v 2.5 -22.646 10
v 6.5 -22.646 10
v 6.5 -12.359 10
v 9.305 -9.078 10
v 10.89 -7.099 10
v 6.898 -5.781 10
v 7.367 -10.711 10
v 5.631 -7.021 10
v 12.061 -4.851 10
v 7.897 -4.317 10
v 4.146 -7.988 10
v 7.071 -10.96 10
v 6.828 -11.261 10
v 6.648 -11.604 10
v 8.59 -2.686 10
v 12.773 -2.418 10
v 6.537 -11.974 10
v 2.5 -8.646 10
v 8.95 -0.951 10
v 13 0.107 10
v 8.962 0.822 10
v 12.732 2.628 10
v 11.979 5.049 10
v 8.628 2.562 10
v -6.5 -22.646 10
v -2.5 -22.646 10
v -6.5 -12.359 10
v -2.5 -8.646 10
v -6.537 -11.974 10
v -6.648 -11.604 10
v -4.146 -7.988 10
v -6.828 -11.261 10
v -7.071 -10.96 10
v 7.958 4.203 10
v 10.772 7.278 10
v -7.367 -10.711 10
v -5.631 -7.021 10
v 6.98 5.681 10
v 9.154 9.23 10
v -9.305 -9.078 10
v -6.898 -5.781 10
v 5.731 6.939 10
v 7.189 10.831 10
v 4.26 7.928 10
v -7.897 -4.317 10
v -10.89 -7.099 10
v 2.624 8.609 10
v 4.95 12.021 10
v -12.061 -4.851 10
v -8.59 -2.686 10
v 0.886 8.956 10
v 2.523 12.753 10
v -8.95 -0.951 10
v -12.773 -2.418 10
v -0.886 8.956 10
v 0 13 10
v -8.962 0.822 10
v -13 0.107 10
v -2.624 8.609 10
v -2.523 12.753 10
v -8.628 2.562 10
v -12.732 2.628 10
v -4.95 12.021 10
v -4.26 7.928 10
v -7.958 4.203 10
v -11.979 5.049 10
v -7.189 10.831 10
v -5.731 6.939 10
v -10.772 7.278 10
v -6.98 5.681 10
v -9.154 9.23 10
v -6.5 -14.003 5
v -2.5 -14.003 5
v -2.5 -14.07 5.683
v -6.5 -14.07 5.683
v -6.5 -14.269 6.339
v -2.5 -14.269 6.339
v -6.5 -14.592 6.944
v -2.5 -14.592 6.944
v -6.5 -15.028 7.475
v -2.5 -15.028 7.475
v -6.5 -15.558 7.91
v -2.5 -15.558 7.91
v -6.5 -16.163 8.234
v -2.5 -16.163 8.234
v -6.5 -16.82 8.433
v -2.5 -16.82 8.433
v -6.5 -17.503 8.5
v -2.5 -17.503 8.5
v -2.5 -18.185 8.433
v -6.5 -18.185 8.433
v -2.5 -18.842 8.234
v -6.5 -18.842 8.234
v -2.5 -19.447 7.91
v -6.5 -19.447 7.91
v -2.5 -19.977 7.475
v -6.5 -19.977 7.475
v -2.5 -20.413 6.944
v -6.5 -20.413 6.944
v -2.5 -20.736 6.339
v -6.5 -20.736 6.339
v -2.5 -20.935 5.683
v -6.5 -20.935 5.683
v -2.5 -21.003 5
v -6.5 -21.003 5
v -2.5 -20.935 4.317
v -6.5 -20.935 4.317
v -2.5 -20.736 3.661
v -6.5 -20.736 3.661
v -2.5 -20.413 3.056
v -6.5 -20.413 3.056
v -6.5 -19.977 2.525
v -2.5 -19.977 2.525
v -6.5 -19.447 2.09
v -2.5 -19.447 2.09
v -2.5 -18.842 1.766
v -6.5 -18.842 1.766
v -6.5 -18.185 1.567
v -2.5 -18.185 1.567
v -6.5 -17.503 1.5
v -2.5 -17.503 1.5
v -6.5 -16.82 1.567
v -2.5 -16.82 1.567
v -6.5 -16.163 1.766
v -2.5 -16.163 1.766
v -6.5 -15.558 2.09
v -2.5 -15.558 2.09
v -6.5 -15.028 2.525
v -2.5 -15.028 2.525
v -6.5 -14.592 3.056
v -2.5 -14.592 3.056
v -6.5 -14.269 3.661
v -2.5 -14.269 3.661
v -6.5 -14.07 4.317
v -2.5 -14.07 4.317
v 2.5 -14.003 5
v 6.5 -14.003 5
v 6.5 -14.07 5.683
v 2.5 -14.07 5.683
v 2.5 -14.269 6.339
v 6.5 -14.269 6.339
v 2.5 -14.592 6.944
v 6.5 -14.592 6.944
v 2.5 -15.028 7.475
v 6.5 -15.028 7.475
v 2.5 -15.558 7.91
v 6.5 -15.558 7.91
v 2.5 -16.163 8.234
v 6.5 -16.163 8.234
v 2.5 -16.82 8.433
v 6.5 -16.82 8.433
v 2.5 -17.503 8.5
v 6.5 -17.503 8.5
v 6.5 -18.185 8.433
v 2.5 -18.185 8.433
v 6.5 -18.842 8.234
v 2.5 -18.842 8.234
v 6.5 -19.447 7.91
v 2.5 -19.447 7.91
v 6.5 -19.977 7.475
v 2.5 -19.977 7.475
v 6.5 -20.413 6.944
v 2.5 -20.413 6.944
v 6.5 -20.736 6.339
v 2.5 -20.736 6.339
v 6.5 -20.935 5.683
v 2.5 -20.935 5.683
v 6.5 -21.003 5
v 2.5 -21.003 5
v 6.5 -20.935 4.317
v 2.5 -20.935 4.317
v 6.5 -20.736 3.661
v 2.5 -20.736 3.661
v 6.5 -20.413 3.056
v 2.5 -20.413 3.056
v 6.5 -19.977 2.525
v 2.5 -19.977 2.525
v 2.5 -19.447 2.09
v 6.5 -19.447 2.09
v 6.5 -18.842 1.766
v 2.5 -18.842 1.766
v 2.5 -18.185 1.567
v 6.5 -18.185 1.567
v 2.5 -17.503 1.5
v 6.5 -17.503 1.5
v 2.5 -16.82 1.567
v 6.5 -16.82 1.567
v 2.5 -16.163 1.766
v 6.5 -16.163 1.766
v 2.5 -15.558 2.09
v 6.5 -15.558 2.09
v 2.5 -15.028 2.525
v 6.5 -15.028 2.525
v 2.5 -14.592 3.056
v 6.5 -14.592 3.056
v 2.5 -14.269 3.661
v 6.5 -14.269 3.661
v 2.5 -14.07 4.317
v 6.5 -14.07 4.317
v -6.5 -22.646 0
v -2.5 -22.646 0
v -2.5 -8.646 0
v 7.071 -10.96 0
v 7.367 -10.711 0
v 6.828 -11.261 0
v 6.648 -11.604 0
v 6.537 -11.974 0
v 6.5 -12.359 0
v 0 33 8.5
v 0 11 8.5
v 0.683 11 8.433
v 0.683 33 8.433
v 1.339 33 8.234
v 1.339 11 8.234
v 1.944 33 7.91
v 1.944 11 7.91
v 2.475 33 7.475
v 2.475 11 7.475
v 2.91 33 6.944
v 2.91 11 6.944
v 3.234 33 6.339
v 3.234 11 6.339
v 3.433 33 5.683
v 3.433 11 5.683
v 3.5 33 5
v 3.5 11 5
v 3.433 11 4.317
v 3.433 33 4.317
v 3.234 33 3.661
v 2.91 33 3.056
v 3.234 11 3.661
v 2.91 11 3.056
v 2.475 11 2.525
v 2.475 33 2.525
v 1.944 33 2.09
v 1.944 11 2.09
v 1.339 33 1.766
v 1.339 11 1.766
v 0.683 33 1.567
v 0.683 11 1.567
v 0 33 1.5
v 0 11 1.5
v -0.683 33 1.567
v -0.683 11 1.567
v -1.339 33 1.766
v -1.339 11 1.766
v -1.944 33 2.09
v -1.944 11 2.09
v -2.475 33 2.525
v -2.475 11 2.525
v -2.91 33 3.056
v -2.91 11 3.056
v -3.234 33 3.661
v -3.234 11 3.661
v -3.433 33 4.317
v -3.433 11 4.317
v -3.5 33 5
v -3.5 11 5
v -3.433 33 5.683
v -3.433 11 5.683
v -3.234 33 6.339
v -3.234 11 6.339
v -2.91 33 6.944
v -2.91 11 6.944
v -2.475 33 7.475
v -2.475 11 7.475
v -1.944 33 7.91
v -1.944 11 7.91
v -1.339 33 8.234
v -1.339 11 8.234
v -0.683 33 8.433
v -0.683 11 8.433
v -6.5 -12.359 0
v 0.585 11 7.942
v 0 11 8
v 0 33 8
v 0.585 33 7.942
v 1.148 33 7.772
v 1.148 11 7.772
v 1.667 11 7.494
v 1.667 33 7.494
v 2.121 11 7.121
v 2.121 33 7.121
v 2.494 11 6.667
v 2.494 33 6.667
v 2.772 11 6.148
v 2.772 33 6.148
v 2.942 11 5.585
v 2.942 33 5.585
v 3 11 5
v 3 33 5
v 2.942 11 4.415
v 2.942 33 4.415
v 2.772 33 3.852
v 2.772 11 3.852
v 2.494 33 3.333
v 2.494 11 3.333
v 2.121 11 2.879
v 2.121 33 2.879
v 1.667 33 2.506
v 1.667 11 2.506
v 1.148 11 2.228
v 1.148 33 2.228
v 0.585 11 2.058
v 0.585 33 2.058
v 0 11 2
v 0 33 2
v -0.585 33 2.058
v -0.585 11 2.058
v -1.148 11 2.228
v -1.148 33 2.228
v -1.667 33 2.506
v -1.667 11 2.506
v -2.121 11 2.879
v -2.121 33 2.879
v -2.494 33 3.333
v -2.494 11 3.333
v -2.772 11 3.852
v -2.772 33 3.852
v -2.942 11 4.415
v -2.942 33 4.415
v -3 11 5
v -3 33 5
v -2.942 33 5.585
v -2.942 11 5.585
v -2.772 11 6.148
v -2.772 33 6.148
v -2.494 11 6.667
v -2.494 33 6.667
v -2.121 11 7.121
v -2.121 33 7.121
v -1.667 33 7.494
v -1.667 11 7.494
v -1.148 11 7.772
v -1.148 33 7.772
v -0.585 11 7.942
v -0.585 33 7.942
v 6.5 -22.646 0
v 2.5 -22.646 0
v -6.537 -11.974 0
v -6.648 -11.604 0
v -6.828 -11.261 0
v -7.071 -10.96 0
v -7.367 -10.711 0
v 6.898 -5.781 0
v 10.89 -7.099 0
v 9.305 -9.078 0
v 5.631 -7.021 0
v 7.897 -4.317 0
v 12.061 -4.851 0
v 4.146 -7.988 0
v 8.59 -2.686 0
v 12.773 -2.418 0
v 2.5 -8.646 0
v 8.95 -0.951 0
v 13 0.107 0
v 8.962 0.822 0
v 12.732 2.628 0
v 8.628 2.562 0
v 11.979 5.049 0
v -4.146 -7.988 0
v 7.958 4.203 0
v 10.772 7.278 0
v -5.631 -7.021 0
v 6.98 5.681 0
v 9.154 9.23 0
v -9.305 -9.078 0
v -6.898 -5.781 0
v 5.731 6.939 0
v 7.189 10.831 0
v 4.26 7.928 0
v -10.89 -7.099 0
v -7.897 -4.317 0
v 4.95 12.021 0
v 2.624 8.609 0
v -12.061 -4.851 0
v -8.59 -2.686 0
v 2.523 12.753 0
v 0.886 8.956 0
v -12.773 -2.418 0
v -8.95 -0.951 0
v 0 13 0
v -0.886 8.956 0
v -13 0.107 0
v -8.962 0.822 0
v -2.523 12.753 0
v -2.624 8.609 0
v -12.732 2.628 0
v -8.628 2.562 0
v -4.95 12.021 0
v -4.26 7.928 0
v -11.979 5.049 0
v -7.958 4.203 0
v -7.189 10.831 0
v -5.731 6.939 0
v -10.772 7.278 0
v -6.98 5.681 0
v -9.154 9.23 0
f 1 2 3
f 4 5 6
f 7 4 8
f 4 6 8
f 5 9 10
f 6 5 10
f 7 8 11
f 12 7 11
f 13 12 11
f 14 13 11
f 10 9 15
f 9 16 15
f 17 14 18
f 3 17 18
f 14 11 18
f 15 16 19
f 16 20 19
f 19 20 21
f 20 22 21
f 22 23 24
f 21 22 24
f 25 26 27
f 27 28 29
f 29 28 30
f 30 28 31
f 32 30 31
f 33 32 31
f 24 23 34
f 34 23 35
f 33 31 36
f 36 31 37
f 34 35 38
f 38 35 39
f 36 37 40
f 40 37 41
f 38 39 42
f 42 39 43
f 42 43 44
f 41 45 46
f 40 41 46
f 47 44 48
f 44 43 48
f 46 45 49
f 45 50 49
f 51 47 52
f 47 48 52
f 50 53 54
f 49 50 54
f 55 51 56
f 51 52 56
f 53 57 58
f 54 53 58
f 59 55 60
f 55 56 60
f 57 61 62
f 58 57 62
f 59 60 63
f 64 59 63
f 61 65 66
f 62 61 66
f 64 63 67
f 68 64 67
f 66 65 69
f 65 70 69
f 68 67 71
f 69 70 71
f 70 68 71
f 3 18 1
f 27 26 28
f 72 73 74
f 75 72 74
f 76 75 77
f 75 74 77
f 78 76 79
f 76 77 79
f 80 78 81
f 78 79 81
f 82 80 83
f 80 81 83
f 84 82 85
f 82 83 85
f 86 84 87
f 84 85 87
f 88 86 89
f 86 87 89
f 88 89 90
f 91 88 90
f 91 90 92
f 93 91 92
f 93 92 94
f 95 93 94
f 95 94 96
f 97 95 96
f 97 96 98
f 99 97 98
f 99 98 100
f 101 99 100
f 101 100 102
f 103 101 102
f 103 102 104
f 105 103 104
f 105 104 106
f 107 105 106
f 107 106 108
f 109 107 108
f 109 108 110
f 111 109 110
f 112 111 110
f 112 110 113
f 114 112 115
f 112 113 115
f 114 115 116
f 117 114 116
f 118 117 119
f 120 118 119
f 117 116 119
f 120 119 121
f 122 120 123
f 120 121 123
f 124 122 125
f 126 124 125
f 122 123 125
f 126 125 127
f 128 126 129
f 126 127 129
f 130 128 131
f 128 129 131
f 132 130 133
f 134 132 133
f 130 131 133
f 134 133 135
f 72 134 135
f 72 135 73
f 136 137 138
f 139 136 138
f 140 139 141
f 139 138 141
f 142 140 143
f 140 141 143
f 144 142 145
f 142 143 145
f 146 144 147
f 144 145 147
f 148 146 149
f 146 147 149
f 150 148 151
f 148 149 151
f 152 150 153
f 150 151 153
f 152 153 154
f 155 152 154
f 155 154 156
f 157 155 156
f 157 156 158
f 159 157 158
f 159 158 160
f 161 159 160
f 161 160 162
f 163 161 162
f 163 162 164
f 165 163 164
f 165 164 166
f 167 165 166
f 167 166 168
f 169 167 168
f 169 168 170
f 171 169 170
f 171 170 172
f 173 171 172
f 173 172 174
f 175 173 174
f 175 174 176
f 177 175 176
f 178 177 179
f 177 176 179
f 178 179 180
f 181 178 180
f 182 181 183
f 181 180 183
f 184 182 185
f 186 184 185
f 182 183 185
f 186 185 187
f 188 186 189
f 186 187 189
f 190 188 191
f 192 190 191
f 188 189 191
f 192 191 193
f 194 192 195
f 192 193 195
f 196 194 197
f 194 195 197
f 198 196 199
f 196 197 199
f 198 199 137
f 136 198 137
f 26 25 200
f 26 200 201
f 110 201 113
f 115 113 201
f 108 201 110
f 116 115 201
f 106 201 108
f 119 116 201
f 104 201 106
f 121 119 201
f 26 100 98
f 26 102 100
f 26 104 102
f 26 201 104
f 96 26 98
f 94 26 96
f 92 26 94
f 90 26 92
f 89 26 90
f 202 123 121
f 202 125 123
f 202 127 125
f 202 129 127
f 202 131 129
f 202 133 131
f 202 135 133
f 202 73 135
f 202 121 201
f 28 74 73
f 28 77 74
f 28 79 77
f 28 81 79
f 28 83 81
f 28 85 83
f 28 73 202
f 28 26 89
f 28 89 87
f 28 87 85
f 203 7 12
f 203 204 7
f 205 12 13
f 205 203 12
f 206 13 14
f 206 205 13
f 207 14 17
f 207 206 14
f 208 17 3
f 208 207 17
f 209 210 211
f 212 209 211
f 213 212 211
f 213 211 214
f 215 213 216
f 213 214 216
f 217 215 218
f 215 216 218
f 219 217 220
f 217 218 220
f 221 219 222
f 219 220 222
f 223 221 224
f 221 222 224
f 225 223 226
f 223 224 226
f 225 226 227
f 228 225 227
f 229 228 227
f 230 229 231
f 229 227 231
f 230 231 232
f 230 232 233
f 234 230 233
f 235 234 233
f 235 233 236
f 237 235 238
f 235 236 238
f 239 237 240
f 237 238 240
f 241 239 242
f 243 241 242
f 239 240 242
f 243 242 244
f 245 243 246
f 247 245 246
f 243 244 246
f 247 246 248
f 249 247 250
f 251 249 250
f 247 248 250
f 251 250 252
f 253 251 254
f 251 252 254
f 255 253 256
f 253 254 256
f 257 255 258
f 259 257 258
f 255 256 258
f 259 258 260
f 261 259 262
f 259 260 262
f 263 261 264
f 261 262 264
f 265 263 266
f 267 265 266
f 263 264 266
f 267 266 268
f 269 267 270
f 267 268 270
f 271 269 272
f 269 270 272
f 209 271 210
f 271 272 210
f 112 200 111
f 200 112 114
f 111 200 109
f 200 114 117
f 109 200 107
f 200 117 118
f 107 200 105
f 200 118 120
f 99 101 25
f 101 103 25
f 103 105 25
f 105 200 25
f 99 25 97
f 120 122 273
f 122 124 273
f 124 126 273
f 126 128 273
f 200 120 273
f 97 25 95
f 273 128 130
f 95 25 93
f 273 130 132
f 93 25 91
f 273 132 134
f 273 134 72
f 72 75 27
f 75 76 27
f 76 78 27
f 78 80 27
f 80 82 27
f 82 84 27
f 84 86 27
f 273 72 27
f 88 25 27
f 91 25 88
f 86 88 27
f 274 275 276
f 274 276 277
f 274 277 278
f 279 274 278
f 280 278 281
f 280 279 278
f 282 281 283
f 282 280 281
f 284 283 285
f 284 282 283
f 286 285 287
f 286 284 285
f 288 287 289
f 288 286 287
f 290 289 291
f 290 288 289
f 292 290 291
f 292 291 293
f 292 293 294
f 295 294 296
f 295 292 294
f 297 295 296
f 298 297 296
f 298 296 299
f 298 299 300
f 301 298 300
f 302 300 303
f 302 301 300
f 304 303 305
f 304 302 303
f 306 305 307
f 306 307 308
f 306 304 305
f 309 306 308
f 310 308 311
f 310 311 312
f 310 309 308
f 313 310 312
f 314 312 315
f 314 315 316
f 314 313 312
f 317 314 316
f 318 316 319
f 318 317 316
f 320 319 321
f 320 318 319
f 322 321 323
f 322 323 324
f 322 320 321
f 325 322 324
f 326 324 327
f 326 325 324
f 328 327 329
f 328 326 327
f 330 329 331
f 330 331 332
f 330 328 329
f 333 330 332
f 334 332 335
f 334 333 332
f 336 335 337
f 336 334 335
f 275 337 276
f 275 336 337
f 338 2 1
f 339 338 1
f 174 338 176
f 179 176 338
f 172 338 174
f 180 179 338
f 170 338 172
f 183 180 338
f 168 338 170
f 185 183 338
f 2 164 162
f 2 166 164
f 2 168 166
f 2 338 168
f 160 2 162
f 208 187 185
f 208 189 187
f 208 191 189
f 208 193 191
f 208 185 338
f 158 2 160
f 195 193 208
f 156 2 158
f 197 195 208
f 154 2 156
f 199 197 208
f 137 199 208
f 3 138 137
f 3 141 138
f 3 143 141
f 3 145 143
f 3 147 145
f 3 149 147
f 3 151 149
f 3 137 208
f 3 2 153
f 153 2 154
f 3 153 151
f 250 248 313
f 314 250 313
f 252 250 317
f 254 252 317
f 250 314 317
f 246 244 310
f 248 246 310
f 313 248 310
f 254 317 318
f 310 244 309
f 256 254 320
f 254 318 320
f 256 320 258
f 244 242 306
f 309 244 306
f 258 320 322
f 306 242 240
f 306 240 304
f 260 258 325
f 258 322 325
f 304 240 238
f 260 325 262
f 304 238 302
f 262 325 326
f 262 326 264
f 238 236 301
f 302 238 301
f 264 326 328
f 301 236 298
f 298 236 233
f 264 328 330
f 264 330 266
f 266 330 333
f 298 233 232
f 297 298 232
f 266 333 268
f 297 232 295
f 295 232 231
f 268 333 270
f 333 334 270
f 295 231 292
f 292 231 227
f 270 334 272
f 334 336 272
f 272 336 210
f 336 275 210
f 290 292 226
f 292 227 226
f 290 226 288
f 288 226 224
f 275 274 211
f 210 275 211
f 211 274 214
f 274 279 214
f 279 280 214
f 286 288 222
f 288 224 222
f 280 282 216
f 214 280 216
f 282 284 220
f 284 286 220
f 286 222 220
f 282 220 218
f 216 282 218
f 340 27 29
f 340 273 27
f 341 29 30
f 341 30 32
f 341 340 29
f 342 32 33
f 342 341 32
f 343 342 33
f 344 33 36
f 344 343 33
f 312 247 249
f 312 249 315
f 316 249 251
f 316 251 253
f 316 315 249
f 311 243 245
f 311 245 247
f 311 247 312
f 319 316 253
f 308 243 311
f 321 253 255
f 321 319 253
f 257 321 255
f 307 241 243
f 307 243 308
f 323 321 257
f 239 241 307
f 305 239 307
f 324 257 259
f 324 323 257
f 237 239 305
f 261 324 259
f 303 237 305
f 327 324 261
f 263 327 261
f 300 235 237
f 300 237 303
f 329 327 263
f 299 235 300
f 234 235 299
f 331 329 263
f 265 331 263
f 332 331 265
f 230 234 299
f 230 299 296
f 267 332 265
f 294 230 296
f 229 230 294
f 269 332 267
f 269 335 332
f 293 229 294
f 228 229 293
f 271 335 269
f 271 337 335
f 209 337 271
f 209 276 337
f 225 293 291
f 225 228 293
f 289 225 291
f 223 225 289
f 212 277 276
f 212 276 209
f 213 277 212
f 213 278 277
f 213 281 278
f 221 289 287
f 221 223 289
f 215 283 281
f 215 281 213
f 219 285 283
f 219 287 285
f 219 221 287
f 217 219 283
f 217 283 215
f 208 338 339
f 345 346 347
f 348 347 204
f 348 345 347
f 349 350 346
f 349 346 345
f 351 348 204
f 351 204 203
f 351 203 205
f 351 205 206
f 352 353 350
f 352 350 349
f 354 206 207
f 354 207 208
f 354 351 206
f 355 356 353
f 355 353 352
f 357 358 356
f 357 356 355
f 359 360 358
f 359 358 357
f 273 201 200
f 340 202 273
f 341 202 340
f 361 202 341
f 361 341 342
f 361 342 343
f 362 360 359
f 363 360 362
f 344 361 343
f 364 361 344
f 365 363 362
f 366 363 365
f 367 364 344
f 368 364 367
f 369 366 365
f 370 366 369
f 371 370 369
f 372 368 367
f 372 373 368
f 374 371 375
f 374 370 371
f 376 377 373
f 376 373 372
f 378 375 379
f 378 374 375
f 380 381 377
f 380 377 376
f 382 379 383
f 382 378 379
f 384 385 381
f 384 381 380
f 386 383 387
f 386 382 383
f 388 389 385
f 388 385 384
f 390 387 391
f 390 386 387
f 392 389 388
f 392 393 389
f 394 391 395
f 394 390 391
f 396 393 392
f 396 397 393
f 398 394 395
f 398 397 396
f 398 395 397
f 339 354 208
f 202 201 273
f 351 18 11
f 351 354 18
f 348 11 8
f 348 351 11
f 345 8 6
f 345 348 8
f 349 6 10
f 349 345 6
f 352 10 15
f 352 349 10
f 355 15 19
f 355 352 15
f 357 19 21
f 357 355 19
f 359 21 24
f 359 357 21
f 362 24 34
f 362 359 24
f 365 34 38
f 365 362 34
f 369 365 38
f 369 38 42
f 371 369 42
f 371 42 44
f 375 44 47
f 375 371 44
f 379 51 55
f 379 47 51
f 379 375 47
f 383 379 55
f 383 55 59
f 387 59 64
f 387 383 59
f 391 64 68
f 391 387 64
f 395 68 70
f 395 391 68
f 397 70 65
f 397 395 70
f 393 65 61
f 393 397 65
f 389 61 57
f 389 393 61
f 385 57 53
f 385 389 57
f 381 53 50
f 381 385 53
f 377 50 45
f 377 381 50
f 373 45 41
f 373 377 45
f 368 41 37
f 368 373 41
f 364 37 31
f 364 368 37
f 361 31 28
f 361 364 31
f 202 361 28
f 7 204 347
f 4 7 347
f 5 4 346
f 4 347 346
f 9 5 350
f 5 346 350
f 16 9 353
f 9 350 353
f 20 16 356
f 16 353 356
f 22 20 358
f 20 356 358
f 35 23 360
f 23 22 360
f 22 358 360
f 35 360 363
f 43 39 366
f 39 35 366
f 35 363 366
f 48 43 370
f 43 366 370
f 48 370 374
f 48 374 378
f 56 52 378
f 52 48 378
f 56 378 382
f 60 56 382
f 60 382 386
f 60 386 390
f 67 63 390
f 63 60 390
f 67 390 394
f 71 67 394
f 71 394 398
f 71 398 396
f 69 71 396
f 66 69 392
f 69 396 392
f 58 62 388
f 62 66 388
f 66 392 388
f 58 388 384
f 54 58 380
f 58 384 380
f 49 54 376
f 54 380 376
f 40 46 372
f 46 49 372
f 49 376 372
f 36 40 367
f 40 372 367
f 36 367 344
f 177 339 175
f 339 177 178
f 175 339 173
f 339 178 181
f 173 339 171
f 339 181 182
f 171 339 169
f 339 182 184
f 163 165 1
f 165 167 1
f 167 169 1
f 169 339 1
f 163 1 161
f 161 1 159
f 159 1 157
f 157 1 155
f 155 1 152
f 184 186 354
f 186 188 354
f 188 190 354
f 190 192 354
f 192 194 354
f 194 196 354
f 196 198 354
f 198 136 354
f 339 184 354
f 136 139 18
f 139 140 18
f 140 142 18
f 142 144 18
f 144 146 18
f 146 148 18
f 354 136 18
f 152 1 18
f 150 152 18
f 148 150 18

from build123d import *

# Parameters (mm, degrees)
SCHIZZO1_R                        = 13
SCHIZZO1_R_2                      = 9
ANELLO_DEPTH                      = 10
SCHIZZO2_W                        = 5
SCHIZZO2_H                        = 13
TAGLIOANELLO_DEPTH                = 21.928449536
SCHIZZO3_W                        = 4
SCHIZZO3_H                        = 14
BORDOVITEDESTRO_DEPTH             = 10
RACCORDODESTRO_R                  = 2
RACCORDOSINISTRO_R                = 2
SCHIZZO4_R                        = 3.5
FOROVITE_DEPTH                    = 32.513213586
AGGANCIOLONGHERONECODA_DEPTH      = 20
AGGANCIOLONGHERONECODA_DEPTH_BACK = 2
SCHIZZO5_R                        = 3.5
SCHIZZO5_R_2                      = 3


with BuildPart() as part:
    # Schizzo1 → Anello (new body)
    with BuildSketch(Plane.XY):
        Circle(SCHIZZO1_R)
        Circle(SCHIZZO1_R_2, mode=Mode.SUBTRACT)
    extrude(amount=ANELLO_DEPTH)

    # Schizzo2 → TaglioAnello (cut, through all)
    with BuildSketch(Plane.XY.offset(10)):
        with Locations((0, -6.5)):
            Rectangle(SCHIZZO2_W, SCHIZZO2_H)
    extrude(amount=-TAGLIOANELLO_DEPTH, mode=Mode.SUBTRACT)

    # Schizzo3 → BordoViteDestro (add)
    with BuildSketch(Plane.XY.offset(10)):
        with Locations((-4.5, -15.645808233)):
            Rectangle(SCHIZZO3_W, SCHIZZO3_H)
    bordovitedestro = extrude(amount=-BORDOVITEDESTRO_DEPTH)

    # BordoViteSinistro: BordoViteDestro across plane
    add(bordovitedestro.mirror(Plane(origin=(0, 0, 0), x_dir=(0, 0, 1), z_dir=(1, 0, 0))))

    # RaccordoDestro
    raccordodestro_edges = [part.edges().sort_by_distance(p)[0] for p in [
        (-6.5, -11.258330249, 5),
    ]]
    fillet(raccordodestro_edges, radius=RACCORDODESTRO_R)

    # RaccordoSinistro
    raccordosinistro_edges = [part.edges().sort_by_distance(p)[0] for p in [
        (6.5, -11.258330249, 5),
    ]]
    fillet(raccordosinistro_edges, radius=RACCORDOSINISTRO_R)

    # Schizzo4 → ForoVite (cut, through all)
    with BuildSketch(Plane(origin=(6.5, 0, 0), x_dir=(0, 0, -1), z_dir=(1, 0, 0))):
        with Locations(Location((-5, -17.502507664, 0), (0, 0, 90))):
            Circle(SCHIZZO4_R)
    extrude(amount=-FOROVITE_DEPTH, mode=Mode.SUBTRACT)


with BuildPart() as body_2:
    # Schizzo5 → AggancioLongheroneCoda (new, two sides: drawn at the far end of the back side and taken through both)
    with BuildSketch(Plane(origin=(0, 13, 0), x_dir=(1, 0, 0), z_dir=(0, 1, 0)).offset(-AGGANCIOLONGHERONECODA_DEPTH_BACK)):
        with Locations(Location((0, -5, 0), (0, 0, 270))):
            Circle(SCHIZZO5_R)
        with Locations(Location((0, -5, 0), (0, 0, 270))):
            Circle(SCHIZZO5_R_2, mode=Mode.SUBTRACT)
    extrude(amount=AGGANCIOLONGHERONECODA_DEPTH + AGGANCIOLONGHERONECODA_DEPTH_BACK)


solid = Compound([part.part, body_2.part])
